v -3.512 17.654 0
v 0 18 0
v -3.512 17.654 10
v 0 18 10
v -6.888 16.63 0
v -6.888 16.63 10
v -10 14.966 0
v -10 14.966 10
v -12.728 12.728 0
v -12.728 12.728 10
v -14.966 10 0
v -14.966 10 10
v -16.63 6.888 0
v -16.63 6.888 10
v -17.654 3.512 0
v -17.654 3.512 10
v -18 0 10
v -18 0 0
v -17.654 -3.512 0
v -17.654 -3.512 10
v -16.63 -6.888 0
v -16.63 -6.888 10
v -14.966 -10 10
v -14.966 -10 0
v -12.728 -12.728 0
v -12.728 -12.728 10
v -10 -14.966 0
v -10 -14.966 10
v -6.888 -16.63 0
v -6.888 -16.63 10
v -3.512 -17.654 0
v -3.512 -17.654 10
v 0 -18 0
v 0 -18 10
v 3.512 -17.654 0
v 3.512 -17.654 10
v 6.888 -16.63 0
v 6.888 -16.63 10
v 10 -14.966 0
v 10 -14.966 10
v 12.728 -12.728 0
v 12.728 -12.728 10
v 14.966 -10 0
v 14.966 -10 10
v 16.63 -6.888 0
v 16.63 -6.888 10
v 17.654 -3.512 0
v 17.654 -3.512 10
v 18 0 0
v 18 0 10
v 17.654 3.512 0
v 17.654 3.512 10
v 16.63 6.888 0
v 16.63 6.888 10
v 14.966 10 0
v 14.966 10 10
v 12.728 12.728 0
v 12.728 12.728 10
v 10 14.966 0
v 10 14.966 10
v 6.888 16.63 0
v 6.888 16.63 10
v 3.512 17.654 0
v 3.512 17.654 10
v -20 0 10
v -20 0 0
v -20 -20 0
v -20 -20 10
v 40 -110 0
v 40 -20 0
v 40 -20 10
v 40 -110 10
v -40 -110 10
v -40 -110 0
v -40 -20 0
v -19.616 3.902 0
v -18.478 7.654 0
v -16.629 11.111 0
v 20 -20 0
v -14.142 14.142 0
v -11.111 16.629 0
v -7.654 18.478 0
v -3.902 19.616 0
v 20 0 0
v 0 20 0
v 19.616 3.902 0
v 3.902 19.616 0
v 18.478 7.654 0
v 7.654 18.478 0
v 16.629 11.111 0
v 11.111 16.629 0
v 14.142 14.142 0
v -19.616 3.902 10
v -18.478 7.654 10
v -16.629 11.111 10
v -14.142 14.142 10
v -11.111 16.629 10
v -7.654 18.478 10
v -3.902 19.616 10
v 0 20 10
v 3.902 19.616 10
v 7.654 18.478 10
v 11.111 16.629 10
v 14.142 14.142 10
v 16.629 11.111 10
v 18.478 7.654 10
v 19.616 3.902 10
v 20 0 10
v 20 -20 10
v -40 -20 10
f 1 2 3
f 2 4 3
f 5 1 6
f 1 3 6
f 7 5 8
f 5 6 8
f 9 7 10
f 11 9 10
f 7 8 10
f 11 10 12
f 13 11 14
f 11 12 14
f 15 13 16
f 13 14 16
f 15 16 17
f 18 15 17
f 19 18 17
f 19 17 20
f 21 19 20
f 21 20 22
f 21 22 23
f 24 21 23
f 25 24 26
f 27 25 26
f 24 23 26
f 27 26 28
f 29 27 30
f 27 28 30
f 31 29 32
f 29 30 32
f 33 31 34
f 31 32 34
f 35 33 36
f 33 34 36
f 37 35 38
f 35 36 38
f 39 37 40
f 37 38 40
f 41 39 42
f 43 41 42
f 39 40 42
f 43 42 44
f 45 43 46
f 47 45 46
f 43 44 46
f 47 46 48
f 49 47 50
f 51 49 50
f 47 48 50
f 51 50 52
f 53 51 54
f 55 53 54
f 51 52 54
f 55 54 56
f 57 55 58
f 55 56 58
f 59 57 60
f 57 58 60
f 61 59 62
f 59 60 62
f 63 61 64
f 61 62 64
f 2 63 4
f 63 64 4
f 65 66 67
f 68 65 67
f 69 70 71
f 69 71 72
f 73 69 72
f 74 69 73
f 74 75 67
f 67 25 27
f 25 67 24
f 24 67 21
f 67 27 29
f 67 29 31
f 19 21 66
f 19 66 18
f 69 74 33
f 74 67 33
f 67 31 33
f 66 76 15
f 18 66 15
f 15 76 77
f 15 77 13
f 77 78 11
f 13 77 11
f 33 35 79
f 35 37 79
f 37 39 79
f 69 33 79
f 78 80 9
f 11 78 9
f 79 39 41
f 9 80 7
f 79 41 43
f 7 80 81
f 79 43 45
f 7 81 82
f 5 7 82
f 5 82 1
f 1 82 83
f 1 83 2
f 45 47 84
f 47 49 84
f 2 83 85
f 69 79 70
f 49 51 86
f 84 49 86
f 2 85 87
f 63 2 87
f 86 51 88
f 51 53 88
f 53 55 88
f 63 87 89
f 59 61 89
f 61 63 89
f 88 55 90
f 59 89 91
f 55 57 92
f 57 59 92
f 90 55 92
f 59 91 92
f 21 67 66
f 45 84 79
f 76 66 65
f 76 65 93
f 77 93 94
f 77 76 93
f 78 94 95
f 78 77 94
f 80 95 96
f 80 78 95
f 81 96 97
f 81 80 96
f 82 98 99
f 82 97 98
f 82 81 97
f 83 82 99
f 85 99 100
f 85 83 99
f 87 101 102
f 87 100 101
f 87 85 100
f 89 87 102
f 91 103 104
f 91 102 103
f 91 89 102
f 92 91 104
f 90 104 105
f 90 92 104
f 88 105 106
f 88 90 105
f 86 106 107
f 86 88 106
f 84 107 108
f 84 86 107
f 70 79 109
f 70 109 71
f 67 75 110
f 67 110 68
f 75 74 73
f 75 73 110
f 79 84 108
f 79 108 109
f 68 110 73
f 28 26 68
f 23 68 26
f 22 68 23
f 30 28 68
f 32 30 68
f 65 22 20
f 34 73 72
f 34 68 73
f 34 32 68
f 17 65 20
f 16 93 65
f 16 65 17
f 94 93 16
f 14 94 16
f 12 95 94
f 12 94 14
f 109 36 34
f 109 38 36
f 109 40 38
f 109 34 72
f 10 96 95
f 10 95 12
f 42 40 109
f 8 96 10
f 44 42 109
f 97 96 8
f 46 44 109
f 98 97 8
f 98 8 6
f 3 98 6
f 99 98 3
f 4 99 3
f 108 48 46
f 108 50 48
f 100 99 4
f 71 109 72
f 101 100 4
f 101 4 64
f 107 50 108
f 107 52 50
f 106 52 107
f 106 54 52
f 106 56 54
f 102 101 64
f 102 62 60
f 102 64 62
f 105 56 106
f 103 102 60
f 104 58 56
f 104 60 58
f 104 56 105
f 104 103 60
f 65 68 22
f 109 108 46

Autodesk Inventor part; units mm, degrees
ref_plane "YZ Plane" through (0, 0, 0) normal (1, 0, 0) x (0, 1, 0)
ref_plane "XZ Plane" through (0, 0, 0) normal (0, 1, 0) x (-1, 0, 0)
ref_plane "XY Plane" through (0, 0, 0) normal (0, 0, 1) x (1, 0, 0)
sketch "Boceto1" plane through (0, 0, 0) normal (0, 0, 1) x (1, 0, 0)
  circle A0 centre (0, 0) radius 18
  circle A1 centre (0, 0) radius 20
  line L0 (0, -20) -> (40, -20)
  line L1 (40, -20) -> (40, -30)
  line L2 (40, -30) -> (0, -30)
  line L3 (0, -30) -> (-40, -30)
  line L4 (-40, -30) -> (-40, -20)
  line L5 (-40, -20) -> (0, -20)
  line L6 (-40, -30) -> (40, -30)
  line L7 (40, -30) -> (40, -110)
  line L8 (40, -110) -> (-40, -110)
  line L9 (-40, -110) -> (-40, -30)
  line L10 (0, 18) -> (0, -21.2387) construction
  circle A2 centre (0, 0) radius 20
  line L11 (20, 0) -> (20, -20)
  line L12 (-20, 0) -> (-20, -20)
  dimension "d0" = 36
  dimension "d1" = 40
  dimension "d2" = 40
  dimension "d3" = 10
  dimension "d4" = 40
  dimension "d5" = 80
extrude "Extrusión1" add sketch "Boceto1" along normal blind 10 contours A0 | A1 | L11 L0 A1 | A1 L5 L12 | L0 L1 L2 L3 L4 L5 | L7 L8 L9 L3 L2
sketch "Boceto2" plane through (0, 0, 0) normal (0, 0, -1) x (-1, 0, 0)
  circle A0 centre (0, 0) radius 18
  dimension "d9" = 36
hole "Agujero1" at (0, 0, 0) direction (0, 0, 1) diameter 36 depth 10 tip angle 118
properties part number "Soporte ensamble"
